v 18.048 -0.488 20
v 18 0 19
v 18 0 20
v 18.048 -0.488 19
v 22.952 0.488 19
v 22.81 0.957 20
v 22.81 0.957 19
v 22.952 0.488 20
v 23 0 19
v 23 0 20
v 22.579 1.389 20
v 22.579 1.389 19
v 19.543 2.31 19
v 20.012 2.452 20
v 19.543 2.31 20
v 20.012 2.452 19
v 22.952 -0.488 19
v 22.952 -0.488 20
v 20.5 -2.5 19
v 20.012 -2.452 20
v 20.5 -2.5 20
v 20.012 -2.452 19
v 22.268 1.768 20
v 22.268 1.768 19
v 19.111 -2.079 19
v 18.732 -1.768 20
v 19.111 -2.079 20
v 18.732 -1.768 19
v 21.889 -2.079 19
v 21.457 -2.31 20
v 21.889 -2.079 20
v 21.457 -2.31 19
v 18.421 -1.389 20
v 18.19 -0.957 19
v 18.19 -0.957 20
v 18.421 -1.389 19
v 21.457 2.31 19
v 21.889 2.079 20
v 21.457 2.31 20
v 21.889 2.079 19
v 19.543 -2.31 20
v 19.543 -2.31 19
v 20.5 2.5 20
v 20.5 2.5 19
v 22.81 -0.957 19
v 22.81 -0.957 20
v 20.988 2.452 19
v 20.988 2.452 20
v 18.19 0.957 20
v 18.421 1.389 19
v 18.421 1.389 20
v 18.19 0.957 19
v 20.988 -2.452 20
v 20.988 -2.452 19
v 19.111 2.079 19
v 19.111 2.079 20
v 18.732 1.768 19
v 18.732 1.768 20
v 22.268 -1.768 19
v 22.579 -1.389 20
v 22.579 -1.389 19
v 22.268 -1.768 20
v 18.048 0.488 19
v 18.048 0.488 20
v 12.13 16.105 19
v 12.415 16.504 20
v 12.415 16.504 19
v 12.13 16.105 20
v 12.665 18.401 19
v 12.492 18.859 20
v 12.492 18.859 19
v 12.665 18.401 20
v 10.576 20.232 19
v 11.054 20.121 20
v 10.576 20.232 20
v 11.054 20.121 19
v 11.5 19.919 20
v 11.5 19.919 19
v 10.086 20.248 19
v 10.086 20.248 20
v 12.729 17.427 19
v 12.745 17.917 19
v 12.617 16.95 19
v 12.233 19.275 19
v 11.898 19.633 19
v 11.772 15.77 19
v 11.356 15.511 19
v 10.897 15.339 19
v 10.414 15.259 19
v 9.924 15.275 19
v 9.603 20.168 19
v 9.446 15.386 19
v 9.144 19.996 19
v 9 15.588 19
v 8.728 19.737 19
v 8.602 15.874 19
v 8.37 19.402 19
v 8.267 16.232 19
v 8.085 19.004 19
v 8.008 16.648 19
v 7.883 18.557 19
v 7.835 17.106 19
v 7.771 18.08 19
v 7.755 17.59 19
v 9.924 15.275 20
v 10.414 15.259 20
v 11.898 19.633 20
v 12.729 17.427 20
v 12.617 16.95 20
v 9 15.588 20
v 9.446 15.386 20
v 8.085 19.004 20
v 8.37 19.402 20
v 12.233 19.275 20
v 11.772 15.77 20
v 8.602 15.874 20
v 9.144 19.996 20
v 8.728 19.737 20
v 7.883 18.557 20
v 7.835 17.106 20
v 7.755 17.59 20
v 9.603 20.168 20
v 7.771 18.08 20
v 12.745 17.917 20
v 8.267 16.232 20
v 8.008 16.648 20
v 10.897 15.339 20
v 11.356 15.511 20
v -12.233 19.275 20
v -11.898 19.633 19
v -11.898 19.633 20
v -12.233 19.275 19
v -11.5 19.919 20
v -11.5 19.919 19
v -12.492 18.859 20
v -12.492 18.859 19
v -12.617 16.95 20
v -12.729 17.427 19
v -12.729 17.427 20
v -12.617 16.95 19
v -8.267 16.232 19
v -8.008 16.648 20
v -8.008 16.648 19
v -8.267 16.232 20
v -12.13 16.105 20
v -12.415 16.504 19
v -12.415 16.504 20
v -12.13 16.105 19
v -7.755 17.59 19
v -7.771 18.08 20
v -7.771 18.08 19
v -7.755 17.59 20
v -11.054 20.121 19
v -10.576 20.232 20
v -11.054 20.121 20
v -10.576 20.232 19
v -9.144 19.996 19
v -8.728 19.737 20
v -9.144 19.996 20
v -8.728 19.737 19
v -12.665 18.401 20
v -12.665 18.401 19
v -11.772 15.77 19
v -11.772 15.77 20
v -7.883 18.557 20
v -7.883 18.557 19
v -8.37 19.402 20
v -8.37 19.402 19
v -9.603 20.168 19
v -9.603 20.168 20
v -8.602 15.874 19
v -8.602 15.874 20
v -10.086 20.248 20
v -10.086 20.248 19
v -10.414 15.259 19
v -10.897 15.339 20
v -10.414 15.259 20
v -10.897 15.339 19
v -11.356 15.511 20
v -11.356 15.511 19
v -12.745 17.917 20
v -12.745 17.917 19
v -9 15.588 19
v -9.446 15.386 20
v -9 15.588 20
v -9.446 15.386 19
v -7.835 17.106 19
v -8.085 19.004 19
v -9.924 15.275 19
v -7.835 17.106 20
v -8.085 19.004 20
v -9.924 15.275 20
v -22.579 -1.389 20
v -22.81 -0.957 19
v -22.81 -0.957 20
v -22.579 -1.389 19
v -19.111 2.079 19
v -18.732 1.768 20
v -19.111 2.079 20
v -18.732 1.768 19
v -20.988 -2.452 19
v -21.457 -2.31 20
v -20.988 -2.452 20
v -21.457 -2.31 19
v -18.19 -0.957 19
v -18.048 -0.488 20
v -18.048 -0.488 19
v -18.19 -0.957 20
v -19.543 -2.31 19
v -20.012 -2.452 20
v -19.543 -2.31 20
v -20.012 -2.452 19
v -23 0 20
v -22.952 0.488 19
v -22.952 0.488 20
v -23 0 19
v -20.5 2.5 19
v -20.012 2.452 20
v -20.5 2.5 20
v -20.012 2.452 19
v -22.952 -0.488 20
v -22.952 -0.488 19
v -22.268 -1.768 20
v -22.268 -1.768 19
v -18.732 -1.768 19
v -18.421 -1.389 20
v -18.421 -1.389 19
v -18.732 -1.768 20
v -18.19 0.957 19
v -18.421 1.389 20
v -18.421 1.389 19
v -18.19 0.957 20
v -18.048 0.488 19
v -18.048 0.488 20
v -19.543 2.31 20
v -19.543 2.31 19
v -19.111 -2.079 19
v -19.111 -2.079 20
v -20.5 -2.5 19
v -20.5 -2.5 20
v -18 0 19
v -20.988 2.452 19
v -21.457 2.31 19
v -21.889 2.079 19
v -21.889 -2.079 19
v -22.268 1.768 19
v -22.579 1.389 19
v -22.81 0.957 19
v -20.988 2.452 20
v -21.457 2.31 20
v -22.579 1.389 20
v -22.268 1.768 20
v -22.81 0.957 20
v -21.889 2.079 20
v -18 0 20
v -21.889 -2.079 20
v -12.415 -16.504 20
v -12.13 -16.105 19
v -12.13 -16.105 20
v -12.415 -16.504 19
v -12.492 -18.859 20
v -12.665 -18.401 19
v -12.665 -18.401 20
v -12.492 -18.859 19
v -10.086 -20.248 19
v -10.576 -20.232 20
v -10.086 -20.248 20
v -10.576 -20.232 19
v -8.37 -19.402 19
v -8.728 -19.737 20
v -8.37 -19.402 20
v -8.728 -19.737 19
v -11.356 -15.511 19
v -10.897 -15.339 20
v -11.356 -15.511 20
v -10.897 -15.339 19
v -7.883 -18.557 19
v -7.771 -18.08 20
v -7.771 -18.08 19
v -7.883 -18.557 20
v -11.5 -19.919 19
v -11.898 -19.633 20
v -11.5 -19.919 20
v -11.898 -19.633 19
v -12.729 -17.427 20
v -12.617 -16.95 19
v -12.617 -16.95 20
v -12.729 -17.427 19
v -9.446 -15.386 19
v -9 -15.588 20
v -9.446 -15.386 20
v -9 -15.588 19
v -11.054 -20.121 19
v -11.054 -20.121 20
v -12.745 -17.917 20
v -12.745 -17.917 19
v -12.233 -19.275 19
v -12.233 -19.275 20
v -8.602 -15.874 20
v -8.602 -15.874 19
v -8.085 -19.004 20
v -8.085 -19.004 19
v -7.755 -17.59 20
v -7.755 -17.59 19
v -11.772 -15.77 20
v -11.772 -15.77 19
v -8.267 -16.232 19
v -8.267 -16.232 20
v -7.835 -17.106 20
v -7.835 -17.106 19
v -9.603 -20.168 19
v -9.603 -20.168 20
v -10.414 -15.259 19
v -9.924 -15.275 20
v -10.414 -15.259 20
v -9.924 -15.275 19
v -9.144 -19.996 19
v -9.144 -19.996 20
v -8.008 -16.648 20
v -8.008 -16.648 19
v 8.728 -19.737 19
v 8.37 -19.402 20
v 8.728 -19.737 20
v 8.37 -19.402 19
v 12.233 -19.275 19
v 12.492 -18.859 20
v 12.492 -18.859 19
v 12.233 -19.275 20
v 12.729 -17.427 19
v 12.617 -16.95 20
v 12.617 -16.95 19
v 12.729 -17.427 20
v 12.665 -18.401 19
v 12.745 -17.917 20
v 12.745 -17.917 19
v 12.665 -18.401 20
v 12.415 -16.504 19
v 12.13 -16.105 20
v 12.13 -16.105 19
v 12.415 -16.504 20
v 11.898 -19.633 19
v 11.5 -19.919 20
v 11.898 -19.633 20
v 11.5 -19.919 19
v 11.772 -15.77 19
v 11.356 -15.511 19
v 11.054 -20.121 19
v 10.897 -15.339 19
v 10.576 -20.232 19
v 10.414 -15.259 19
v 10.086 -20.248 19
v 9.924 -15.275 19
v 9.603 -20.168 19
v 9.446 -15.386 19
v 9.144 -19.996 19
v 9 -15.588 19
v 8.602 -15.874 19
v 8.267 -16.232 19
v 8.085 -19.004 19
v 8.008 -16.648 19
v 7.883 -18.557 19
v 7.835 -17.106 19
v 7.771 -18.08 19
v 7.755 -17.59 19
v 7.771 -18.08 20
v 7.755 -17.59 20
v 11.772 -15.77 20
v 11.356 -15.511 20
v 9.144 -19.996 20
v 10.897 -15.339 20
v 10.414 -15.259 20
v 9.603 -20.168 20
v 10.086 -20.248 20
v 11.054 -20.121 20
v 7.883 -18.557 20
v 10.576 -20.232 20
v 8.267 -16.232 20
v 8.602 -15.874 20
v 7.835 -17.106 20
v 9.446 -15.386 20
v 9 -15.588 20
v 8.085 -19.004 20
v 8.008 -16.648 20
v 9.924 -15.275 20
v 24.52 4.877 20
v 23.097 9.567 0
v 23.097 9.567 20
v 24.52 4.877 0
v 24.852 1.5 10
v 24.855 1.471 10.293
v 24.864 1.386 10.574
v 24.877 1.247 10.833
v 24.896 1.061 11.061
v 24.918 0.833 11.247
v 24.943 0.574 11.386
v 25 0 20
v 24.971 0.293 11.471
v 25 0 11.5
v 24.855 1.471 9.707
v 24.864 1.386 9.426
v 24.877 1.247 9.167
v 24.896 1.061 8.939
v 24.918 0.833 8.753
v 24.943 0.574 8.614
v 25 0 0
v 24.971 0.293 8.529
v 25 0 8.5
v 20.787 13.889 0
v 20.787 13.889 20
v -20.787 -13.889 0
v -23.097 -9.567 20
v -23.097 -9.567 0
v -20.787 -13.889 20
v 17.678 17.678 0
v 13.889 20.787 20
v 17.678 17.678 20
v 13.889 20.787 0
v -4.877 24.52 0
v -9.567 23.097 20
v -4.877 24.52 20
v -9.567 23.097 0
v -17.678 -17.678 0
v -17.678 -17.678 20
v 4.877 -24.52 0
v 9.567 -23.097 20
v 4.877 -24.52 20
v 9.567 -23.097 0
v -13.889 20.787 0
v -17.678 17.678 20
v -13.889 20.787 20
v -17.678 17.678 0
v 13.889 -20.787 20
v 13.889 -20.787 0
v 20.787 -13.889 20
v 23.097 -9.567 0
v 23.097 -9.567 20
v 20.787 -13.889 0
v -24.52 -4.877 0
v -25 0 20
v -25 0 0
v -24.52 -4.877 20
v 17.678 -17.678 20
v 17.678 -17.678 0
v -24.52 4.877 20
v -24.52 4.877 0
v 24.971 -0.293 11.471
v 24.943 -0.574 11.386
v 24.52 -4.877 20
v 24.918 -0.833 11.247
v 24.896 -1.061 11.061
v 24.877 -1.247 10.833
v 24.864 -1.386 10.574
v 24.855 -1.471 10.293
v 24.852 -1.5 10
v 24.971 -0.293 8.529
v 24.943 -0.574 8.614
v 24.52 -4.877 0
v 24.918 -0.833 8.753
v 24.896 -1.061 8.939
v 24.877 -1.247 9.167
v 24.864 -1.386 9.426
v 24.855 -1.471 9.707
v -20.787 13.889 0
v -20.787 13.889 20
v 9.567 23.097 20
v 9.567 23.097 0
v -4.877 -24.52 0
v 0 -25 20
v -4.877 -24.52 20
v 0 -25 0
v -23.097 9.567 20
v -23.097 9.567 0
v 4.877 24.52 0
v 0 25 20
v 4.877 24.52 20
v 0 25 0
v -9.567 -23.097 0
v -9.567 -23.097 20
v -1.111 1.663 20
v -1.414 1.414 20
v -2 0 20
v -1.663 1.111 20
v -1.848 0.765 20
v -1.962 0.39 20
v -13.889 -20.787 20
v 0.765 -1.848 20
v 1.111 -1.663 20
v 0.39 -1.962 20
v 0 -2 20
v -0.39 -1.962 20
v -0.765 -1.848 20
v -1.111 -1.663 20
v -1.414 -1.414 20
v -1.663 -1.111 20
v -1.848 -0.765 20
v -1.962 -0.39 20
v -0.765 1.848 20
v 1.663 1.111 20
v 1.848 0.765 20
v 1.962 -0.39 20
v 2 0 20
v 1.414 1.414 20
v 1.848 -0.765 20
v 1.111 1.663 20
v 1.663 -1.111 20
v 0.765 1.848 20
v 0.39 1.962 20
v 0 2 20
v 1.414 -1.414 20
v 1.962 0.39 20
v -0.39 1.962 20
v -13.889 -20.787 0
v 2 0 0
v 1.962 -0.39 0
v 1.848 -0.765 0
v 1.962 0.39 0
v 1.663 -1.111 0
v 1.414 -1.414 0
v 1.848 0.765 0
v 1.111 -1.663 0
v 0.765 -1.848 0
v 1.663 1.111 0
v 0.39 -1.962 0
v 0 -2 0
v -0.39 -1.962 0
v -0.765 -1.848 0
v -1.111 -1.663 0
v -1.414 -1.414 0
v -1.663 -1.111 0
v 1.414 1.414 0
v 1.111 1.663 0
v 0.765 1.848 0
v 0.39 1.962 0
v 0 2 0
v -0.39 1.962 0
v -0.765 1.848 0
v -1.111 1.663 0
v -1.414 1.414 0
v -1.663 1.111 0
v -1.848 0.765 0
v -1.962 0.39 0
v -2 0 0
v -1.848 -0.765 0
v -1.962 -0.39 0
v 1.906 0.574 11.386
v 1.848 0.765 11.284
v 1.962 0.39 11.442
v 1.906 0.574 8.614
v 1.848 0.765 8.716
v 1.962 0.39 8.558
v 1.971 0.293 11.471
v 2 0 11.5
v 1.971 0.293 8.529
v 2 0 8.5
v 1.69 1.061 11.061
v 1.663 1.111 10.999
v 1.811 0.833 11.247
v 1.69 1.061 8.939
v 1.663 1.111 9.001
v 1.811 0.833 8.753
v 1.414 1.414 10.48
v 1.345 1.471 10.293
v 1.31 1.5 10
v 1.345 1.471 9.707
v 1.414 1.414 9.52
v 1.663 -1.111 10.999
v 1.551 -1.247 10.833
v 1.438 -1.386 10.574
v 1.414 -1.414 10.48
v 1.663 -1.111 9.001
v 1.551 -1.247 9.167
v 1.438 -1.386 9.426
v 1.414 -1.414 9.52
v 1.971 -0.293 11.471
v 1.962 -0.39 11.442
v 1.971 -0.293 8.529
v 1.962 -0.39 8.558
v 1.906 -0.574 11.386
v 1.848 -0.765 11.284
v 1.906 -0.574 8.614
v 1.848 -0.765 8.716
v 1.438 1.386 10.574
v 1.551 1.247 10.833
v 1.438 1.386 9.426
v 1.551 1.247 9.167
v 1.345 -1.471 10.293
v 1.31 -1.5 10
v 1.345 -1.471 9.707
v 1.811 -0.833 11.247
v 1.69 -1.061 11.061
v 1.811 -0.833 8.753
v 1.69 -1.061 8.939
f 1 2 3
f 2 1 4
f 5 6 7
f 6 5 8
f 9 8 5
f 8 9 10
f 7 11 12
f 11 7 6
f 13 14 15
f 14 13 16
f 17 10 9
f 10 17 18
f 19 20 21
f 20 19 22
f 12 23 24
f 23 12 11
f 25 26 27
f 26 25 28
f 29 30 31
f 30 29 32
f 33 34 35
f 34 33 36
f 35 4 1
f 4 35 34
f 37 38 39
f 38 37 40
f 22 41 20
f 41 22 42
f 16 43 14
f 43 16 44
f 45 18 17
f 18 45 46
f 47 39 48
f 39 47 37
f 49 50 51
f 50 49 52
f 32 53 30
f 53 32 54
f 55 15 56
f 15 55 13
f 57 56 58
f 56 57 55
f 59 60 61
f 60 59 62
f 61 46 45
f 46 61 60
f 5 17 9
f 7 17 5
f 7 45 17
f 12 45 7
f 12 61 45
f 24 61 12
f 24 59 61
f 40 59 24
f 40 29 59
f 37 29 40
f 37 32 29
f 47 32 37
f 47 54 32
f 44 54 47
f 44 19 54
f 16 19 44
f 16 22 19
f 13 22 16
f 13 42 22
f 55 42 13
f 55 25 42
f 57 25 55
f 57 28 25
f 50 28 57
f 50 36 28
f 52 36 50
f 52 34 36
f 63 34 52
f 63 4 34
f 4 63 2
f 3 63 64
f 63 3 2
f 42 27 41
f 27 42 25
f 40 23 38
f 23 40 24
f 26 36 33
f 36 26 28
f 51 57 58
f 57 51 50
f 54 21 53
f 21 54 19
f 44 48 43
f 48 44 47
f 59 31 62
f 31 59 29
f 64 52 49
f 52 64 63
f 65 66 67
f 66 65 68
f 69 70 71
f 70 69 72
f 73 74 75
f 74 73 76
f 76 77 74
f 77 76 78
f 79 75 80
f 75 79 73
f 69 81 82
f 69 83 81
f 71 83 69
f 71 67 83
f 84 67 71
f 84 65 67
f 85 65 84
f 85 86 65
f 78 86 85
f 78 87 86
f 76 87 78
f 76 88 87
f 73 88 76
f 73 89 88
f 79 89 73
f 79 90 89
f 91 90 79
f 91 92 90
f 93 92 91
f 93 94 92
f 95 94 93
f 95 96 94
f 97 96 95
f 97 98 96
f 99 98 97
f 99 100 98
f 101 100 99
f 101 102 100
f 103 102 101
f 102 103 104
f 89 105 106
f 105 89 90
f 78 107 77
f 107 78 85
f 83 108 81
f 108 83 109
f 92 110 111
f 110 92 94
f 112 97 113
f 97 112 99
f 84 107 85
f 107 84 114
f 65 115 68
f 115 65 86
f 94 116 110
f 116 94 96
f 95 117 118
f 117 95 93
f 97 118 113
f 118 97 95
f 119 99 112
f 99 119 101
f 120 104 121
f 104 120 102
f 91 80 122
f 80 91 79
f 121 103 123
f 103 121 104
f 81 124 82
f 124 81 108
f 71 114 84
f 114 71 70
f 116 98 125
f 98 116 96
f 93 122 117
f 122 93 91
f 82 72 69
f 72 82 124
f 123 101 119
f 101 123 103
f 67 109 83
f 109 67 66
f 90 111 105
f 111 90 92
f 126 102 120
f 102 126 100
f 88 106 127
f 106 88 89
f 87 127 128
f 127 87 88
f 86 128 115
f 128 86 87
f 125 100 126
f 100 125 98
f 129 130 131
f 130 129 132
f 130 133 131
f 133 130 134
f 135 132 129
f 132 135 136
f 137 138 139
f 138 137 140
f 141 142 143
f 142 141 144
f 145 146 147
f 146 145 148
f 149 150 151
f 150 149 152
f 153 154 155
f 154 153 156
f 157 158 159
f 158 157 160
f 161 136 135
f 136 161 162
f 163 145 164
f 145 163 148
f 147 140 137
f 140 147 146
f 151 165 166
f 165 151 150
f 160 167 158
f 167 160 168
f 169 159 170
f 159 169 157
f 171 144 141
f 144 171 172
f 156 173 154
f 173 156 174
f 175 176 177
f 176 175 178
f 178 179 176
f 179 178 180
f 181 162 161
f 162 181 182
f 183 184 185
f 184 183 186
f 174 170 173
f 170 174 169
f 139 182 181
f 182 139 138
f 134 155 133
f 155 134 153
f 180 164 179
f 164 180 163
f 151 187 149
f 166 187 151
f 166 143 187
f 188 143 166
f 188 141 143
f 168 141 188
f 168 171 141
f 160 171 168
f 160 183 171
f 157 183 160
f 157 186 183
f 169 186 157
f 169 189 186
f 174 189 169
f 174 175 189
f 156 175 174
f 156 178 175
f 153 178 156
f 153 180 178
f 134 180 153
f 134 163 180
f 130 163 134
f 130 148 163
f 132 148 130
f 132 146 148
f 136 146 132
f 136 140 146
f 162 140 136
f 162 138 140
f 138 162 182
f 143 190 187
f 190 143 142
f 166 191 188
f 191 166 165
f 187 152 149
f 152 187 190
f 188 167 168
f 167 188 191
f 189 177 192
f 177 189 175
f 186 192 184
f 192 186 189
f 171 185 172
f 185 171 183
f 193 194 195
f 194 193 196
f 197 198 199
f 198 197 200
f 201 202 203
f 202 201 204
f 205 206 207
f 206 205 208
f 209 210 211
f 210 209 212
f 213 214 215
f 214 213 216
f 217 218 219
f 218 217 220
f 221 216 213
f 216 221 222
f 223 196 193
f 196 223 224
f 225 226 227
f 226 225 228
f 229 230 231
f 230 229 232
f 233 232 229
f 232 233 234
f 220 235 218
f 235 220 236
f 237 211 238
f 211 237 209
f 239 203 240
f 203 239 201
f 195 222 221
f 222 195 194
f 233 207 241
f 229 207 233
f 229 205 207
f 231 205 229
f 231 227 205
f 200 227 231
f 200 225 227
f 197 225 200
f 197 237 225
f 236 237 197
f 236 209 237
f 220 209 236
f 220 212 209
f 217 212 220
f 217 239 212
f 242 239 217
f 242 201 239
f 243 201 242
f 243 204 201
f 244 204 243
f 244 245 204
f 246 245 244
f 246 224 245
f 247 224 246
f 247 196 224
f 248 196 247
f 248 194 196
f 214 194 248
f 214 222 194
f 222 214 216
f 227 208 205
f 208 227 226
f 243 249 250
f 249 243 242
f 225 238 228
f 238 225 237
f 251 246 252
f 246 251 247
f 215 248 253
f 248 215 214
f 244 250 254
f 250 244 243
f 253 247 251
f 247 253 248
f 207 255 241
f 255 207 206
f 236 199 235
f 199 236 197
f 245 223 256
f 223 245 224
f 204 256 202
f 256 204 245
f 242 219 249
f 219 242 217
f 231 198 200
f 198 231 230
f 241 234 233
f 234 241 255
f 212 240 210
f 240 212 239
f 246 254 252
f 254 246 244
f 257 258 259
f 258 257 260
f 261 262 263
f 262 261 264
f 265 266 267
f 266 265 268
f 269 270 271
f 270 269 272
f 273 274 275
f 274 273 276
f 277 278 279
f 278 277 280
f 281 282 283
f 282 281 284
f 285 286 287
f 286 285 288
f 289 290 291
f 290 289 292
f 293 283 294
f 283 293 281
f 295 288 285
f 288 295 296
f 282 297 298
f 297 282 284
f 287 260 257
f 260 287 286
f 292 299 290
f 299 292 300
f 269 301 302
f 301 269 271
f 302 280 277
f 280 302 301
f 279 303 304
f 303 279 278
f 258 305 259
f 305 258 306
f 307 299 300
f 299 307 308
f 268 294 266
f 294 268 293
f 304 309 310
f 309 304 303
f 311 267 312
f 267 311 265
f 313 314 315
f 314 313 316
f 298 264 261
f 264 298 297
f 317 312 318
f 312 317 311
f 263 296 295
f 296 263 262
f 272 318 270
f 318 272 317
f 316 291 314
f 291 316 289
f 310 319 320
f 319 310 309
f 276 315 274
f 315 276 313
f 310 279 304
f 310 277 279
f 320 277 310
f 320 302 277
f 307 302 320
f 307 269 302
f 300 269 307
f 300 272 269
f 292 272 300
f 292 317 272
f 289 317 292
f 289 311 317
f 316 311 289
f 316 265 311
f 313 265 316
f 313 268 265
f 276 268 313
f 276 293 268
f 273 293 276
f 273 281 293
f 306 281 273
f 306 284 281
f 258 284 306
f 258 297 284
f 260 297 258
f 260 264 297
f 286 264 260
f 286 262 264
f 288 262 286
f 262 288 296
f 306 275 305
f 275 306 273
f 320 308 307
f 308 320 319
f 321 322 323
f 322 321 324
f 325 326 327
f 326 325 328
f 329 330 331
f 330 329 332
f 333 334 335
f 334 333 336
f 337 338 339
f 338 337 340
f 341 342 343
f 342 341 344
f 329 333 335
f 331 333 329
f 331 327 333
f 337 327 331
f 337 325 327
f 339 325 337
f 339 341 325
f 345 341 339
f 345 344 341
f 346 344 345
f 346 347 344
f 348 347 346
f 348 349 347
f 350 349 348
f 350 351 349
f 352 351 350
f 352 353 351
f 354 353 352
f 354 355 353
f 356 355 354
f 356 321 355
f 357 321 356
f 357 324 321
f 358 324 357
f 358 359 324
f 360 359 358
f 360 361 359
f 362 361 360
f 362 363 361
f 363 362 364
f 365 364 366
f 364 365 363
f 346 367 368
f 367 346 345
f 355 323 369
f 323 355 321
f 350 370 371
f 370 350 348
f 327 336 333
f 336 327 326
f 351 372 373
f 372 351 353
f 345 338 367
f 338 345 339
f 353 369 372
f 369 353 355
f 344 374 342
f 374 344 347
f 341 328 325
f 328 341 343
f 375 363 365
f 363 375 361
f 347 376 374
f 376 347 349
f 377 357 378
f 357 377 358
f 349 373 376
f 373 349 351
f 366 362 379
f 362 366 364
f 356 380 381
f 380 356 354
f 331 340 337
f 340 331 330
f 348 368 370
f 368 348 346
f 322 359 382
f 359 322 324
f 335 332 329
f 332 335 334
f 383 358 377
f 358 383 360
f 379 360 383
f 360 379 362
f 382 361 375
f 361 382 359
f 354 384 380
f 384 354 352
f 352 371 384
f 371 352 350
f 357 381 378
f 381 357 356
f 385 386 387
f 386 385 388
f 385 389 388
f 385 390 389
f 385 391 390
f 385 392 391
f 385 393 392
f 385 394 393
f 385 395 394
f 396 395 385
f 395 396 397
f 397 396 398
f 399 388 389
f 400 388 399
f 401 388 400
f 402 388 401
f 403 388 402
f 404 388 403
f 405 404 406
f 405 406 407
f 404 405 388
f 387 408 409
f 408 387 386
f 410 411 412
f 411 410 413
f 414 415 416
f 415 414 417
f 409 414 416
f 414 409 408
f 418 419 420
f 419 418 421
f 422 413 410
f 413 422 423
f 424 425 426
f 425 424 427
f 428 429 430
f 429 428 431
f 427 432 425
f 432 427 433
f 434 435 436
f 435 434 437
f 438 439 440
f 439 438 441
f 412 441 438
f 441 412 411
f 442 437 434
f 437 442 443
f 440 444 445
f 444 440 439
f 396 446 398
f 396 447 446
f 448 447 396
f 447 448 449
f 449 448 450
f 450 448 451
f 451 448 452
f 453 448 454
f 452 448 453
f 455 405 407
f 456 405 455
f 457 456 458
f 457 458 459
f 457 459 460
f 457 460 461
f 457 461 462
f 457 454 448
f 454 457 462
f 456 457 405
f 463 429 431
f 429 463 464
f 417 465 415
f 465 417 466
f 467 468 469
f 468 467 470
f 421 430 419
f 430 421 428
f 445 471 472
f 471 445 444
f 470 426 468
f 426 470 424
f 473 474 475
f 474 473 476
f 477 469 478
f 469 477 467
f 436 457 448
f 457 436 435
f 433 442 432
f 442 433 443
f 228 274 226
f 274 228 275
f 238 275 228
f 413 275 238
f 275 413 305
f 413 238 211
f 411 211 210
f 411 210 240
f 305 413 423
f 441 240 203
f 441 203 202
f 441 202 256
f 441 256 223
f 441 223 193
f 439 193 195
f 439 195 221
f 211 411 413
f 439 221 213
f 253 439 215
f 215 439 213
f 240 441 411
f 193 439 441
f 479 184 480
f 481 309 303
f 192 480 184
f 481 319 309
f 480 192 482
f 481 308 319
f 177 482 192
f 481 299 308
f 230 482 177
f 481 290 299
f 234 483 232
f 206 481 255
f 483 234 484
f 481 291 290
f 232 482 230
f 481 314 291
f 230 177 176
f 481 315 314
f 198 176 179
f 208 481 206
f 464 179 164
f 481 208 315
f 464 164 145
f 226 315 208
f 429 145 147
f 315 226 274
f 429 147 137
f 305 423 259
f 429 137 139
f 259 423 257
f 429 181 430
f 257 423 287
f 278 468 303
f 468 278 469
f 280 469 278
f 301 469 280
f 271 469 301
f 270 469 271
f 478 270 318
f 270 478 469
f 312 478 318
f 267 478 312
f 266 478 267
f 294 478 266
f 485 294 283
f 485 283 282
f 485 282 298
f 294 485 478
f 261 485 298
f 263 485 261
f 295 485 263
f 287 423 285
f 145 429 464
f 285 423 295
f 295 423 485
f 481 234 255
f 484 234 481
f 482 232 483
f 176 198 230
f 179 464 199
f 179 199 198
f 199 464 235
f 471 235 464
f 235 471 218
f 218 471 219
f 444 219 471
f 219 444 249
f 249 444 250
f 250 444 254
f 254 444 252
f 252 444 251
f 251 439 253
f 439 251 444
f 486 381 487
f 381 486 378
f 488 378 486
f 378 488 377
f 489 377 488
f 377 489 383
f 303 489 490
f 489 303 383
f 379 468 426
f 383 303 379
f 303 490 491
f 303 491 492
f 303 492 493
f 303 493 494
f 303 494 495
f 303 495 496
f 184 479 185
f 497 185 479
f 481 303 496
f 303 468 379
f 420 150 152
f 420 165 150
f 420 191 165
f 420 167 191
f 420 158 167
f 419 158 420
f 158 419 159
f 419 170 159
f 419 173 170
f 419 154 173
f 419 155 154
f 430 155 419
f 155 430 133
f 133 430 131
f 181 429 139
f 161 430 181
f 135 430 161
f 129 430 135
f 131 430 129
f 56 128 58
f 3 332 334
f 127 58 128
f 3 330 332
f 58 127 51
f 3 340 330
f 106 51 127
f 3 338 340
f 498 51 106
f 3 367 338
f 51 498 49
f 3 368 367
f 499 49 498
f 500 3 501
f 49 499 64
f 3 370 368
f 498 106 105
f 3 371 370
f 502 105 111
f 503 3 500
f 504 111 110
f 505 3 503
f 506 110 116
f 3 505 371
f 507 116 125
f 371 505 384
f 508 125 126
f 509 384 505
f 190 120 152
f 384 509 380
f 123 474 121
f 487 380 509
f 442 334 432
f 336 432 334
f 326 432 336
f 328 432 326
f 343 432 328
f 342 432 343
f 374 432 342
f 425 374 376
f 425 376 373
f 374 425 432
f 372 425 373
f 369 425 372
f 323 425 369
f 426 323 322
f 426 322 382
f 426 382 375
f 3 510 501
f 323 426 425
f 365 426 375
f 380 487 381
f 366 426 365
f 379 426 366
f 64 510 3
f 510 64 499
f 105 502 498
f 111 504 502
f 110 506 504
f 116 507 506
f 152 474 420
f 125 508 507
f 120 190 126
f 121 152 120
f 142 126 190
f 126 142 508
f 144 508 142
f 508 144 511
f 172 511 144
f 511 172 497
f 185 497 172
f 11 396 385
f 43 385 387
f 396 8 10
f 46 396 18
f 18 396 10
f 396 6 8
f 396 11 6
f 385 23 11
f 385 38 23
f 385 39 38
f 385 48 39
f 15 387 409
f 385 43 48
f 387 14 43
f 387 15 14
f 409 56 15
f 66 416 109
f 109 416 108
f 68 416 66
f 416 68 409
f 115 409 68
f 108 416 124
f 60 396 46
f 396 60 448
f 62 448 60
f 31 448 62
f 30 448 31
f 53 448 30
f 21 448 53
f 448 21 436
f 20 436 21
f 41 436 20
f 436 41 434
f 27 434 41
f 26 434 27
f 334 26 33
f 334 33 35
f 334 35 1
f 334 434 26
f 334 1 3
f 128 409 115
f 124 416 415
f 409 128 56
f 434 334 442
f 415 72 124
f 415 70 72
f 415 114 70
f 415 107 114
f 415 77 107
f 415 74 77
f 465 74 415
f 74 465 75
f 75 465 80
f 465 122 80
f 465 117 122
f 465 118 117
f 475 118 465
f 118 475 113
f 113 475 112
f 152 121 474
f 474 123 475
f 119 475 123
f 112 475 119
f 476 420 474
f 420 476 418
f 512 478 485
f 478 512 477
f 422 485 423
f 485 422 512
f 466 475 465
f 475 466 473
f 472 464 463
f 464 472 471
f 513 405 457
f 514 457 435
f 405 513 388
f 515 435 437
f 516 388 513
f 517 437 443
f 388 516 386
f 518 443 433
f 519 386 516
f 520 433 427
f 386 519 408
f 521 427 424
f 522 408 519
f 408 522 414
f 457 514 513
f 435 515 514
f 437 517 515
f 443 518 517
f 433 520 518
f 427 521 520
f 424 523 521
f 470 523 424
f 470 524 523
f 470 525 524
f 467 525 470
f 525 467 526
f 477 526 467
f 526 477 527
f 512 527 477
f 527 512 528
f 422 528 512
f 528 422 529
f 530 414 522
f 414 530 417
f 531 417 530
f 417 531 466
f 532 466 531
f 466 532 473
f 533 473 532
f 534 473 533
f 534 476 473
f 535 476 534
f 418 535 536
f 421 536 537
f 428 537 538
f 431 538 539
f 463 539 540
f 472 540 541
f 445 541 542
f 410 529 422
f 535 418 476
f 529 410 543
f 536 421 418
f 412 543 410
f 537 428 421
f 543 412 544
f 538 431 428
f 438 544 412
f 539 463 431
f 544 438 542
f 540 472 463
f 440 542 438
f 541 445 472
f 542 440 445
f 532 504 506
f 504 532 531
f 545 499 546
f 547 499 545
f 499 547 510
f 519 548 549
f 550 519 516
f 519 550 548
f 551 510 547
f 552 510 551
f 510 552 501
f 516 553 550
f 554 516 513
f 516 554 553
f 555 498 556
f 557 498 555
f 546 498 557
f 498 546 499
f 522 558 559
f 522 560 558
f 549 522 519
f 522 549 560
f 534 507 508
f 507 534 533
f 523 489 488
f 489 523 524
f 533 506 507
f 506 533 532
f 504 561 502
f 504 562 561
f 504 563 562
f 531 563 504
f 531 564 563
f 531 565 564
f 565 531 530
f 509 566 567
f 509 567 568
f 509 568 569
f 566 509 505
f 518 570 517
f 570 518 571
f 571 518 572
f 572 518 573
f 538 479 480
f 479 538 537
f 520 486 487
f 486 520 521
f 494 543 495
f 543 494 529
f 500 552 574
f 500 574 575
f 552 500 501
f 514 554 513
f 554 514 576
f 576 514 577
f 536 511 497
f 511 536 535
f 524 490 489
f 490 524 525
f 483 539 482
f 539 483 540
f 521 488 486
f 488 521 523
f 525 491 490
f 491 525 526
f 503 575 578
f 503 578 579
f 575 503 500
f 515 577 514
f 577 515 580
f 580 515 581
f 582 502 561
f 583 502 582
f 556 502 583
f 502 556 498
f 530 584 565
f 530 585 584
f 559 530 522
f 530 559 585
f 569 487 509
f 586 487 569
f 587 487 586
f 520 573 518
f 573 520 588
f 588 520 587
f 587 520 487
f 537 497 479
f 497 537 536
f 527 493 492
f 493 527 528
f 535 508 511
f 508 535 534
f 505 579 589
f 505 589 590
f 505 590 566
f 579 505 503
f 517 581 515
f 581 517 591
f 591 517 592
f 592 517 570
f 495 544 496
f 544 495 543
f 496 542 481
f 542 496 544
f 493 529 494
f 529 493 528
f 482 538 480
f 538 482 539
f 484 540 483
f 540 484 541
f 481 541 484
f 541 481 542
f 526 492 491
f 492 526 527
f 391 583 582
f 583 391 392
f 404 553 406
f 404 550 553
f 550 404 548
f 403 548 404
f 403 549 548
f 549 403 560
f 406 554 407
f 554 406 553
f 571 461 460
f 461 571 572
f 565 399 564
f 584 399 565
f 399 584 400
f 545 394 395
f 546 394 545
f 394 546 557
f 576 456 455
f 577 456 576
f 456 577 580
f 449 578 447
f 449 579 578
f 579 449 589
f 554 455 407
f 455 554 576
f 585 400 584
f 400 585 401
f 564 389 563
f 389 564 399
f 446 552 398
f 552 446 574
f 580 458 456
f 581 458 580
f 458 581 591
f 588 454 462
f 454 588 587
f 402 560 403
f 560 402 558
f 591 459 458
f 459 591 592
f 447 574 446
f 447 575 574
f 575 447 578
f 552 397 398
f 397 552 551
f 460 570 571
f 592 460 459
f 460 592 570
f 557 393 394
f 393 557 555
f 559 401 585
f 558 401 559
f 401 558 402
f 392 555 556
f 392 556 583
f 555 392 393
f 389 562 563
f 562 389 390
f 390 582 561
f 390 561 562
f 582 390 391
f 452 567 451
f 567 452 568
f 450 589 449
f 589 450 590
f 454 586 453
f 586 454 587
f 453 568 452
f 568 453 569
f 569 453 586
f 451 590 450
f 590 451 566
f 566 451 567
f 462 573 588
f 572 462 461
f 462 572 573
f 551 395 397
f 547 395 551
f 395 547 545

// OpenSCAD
$fn = 32;

// ----------------------------------------------------------------------
// Control knob: dimpled knob
// ----------------------------------------------------------------------

// --- parameters (mm) ---
dimp_d = 5;               // finger dimple diameter
n_dimp = 6;               // number of dimples
dimp_r = 20.5;            // dimple ring radius
knob_d = 50;              // knob body diameter
knob_h = 20;              // knob body height
bore_d = 4;               // shaft bore diameter
set_d = 3;                // set screw bore diameter

dimp_step = 360 / n_dimp;  // dimple angular step

difference() {
  cylinder(h = knob_h, d = knob_d);
  translate([0, 0, -1]) cylinder(h = knob_h + 2, d = bore_d);
  translate([-1, 0, knob_h / 2]) rotate([0, 90, 0])
    cylinder(h = knob_d / 2 + bore_d / 2 + 2, d = set_d);  for (i = [0 : n_dimp - 1])
    rotate([0, 0, i * dimp_step])
      translate([dimp_r, 0, knob_h - 1])
        cylinder(h = 2, d = dimp_d);
}
